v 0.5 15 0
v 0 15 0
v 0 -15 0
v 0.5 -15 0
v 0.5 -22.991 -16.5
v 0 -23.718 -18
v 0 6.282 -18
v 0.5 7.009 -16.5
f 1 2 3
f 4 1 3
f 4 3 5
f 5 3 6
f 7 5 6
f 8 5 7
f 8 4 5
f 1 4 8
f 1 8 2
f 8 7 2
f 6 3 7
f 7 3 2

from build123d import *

# Parameters (mm, degrees)
F1_DEPTH = 0.5
F2_SIZE2 = 1.49999
F2_SIZE  = 0.49999


# Not quite as in the source:
# - a fillet or chamfer is up to 0.001 mm smaller than in the source, because OpenCascade refuses the exact size


with BuildPart() as f1:
    # F0 (on Right) → F1 (new body)
    with BuildSketch(Plane.YZ):
        Polygon((15, 0), (-15, 0), (-23.7177978871, -18), (6.2822021129, -18), align=None)
    extrude(amount=F1_DEPTH)

    # F2 (size 0.5 and 1.5 in the source; OpenCascade refuses exactly that, so slightly less here)
    f2_edges = [f1.edges().sort_by_distance(p)[0] for p in [
        (0.5, -8.717798, -18),
    ]]
    f2_side = f1.faces().sort_by_distance((0.25, -8.717798, -18))[0]
    chamfer(f2_edges, length=F2_SIZE, length2=F2_SIZE2, reference=f2_side)


solid = f1.part
